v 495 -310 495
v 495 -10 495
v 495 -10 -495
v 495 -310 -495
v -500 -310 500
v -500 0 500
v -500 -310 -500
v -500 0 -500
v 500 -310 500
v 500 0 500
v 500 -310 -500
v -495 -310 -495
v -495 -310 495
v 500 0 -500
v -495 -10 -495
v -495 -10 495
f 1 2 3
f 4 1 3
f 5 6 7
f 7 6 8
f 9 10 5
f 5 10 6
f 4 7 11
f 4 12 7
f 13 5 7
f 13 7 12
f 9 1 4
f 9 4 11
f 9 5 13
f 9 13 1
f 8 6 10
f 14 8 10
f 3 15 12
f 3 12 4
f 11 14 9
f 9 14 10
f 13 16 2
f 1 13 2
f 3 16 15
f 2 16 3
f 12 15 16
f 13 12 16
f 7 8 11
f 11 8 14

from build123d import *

# Parameters (mm, degrees)
F0_W     = 1000
F0_H     = 1000
F1_DEPTH = 10
F2_W     = 990
F2_H     = 5
F3_DEPTH = 300


with BuildPart() as f1:
    # F0 (on Front) → F1 (new body)
    with BuildSketch(Plane.XZ):
        Rectangle(F0_W, F0_H)
    extrude(amount=F1_DEPTH)

    # F2 (on face) → F3 (join)
    with BuildSketch(Plane.XZ.offset(10)):
        Polygon((-495, 500), (-500, 500), (-500, -500), (-495, -500), (-495, -495), (-495, 495), align=None)
        Polygon((500, 500), (-495, 500), (-495, 495), (495, 495), (500, 495), align=None)
        with Locations((0, -497.5)):
            Rectangle(F2_W, F2_H)
        Polygon((500, 495), (495, 495), (495, -495), (495, -500), (500, -500), align=None)
    extrude(amount=F3_DEPTH)


solid = f1.part
